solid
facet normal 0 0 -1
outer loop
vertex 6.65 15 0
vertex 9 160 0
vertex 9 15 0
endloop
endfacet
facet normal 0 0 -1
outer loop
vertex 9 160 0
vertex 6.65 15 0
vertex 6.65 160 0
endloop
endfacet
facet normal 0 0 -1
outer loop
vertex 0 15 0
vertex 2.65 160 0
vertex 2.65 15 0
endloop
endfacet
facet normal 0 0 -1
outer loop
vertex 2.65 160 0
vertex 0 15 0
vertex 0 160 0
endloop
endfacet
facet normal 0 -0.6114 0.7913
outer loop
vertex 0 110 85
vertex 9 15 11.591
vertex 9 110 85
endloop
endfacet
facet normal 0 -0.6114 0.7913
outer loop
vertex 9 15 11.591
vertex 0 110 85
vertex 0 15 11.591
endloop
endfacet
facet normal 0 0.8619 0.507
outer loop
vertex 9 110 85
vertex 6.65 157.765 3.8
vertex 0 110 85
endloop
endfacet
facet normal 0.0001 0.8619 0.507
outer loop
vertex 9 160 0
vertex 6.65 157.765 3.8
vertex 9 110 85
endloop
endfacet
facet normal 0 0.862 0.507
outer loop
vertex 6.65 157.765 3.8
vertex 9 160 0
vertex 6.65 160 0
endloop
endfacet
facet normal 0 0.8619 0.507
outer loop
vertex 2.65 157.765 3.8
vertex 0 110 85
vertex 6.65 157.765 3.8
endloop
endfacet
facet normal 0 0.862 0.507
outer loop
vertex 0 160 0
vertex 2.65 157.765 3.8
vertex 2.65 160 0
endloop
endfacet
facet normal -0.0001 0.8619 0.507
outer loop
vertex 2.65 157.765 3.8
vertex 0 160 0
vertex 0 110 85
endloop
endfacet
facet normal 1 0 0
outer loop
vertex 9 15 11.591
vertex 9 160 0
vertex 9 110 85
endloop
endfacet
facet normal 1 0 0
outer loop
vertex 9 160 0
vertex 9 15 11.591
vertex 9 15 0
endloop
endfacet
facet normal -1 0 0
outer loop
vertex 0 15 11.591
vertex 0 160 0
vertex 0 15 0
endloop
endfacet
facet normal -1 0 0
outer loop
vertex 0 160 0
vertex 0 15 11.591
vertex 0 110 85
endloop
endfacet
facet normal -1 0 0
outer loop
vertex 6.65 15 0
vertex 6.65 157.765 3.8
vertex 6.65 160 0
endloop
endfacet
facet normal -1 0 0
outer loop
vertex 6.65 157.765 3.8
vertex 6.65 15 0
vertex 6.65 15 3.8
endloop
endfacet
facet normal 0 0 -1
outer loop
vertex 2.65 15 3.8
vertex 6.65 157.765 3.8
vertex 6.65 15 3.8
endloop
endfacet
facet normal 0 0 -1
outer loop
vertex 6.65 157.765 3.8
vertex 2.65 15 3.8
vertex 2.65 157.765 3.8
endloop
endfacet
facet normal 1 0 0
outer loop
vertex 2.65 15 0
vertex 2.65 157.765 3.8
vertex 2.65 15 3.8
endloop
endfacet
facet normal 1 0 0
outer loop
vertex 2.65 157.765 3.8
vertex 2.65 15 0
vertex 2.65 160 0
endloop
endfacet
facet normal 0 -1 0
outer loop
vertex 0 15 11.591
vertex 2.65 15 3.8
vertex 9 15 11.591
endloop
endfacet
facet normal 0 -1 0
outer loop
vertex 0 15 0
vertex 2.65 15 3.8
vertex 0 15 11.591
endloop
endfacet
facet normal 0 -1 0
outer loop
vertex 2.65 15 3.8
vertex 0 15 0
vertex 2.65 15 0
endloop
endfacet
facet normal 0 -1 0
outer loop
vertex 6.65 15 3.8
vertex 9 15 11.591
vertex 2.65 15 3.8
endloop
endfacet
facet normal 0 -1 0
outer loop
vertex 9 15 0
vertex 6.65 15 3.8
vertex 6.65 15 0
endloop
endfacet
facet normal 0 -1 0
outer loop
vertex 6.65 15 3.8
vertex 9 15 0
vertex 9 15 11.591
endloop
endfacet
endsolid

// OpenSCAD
difference(){
    polyhedron(
        points=[[0,0,0], [9,0,0], [9,160,0], [0,160,0], [0,110,85], [9,110,85]],
        faces=[[0,1,2,3],[5,4,3,2],[0,4,5,1],[0,3,4],[5,2,1]]
    );
    
    translate([2.65, 0, -.2]){
        cube([4, 300, 4]);
    }
    
    translate([-.2, 0, -.2]){
        cube([15, 15, 15]);
    }
}
